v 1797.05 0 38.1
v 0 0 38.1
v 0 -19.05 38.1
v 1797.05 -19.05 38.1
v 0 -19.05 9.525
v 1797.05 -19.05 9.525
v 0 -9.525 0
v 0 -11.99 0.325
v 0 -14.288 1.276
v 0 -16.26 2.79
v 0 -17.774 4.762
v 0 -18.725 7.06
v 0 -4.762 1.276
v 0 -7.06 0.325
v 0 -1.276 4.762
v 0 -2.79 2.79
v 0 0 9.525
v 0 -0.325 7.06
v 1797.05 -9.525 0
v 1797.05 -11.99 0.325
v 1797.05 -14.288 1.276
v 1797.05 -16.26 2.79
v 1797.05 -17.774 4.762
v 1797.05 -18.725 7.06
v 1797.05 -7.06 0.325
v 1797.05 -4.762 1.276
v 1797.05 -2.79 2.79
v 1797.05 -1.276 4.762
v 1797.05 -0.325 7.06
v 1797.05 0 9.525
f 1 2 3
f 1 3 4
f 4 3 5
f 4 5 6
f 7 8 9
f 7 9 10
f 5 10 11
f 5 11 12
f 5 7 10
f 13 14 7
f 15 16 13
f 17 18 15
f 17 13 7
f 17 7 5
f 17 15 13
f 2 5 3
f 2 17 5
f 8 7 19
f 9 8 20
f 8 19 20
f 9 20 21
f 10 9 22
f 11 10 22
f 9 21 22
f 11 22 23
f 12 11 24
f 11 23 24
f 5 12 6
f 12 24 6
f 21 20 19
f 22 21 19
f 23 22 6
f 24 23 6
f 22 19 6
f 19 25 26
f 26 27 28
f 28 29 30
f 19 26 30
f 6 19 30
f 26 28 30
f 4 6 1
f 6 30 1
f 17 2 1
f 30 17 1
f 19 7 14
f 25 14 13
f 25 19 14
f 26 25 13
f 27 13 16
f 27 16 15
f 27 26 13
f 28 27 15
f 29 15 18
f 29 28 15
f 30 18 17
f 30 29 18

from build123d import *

# Parameters (mm, degrees)
F0_W     = 1797.05
F0_H     = 38.1
F1_DEPTH = 19.05
F2_R     = 9.52499


# Not quite as in the source:
# - a fillet or chamfer is up to 0.001 mm smaller than in the source, because OpenCascade refuses the exact size


with BuildPart() as f1:
    # F0 (on Front) → F1 (new body)
    with BuildSketch(Plane.XZ):
        with Locations((898.525, 19.05)):
            Rectangle(F0_W, F0_H)
    extrude(amount=F1_DEPTH)

    # F2 (radius 9.525 in the source; OpenCascade refuses exactly that, so slightly less here)
    f2_edges = [f1.edges().sort_by_distance(p)[0] for p in [
        (898.525, -19.05, 0),
        (898.525, 0, 0),
    ]]
    fillet(f2_edges, radius=F2_R)


solid = f1.part
